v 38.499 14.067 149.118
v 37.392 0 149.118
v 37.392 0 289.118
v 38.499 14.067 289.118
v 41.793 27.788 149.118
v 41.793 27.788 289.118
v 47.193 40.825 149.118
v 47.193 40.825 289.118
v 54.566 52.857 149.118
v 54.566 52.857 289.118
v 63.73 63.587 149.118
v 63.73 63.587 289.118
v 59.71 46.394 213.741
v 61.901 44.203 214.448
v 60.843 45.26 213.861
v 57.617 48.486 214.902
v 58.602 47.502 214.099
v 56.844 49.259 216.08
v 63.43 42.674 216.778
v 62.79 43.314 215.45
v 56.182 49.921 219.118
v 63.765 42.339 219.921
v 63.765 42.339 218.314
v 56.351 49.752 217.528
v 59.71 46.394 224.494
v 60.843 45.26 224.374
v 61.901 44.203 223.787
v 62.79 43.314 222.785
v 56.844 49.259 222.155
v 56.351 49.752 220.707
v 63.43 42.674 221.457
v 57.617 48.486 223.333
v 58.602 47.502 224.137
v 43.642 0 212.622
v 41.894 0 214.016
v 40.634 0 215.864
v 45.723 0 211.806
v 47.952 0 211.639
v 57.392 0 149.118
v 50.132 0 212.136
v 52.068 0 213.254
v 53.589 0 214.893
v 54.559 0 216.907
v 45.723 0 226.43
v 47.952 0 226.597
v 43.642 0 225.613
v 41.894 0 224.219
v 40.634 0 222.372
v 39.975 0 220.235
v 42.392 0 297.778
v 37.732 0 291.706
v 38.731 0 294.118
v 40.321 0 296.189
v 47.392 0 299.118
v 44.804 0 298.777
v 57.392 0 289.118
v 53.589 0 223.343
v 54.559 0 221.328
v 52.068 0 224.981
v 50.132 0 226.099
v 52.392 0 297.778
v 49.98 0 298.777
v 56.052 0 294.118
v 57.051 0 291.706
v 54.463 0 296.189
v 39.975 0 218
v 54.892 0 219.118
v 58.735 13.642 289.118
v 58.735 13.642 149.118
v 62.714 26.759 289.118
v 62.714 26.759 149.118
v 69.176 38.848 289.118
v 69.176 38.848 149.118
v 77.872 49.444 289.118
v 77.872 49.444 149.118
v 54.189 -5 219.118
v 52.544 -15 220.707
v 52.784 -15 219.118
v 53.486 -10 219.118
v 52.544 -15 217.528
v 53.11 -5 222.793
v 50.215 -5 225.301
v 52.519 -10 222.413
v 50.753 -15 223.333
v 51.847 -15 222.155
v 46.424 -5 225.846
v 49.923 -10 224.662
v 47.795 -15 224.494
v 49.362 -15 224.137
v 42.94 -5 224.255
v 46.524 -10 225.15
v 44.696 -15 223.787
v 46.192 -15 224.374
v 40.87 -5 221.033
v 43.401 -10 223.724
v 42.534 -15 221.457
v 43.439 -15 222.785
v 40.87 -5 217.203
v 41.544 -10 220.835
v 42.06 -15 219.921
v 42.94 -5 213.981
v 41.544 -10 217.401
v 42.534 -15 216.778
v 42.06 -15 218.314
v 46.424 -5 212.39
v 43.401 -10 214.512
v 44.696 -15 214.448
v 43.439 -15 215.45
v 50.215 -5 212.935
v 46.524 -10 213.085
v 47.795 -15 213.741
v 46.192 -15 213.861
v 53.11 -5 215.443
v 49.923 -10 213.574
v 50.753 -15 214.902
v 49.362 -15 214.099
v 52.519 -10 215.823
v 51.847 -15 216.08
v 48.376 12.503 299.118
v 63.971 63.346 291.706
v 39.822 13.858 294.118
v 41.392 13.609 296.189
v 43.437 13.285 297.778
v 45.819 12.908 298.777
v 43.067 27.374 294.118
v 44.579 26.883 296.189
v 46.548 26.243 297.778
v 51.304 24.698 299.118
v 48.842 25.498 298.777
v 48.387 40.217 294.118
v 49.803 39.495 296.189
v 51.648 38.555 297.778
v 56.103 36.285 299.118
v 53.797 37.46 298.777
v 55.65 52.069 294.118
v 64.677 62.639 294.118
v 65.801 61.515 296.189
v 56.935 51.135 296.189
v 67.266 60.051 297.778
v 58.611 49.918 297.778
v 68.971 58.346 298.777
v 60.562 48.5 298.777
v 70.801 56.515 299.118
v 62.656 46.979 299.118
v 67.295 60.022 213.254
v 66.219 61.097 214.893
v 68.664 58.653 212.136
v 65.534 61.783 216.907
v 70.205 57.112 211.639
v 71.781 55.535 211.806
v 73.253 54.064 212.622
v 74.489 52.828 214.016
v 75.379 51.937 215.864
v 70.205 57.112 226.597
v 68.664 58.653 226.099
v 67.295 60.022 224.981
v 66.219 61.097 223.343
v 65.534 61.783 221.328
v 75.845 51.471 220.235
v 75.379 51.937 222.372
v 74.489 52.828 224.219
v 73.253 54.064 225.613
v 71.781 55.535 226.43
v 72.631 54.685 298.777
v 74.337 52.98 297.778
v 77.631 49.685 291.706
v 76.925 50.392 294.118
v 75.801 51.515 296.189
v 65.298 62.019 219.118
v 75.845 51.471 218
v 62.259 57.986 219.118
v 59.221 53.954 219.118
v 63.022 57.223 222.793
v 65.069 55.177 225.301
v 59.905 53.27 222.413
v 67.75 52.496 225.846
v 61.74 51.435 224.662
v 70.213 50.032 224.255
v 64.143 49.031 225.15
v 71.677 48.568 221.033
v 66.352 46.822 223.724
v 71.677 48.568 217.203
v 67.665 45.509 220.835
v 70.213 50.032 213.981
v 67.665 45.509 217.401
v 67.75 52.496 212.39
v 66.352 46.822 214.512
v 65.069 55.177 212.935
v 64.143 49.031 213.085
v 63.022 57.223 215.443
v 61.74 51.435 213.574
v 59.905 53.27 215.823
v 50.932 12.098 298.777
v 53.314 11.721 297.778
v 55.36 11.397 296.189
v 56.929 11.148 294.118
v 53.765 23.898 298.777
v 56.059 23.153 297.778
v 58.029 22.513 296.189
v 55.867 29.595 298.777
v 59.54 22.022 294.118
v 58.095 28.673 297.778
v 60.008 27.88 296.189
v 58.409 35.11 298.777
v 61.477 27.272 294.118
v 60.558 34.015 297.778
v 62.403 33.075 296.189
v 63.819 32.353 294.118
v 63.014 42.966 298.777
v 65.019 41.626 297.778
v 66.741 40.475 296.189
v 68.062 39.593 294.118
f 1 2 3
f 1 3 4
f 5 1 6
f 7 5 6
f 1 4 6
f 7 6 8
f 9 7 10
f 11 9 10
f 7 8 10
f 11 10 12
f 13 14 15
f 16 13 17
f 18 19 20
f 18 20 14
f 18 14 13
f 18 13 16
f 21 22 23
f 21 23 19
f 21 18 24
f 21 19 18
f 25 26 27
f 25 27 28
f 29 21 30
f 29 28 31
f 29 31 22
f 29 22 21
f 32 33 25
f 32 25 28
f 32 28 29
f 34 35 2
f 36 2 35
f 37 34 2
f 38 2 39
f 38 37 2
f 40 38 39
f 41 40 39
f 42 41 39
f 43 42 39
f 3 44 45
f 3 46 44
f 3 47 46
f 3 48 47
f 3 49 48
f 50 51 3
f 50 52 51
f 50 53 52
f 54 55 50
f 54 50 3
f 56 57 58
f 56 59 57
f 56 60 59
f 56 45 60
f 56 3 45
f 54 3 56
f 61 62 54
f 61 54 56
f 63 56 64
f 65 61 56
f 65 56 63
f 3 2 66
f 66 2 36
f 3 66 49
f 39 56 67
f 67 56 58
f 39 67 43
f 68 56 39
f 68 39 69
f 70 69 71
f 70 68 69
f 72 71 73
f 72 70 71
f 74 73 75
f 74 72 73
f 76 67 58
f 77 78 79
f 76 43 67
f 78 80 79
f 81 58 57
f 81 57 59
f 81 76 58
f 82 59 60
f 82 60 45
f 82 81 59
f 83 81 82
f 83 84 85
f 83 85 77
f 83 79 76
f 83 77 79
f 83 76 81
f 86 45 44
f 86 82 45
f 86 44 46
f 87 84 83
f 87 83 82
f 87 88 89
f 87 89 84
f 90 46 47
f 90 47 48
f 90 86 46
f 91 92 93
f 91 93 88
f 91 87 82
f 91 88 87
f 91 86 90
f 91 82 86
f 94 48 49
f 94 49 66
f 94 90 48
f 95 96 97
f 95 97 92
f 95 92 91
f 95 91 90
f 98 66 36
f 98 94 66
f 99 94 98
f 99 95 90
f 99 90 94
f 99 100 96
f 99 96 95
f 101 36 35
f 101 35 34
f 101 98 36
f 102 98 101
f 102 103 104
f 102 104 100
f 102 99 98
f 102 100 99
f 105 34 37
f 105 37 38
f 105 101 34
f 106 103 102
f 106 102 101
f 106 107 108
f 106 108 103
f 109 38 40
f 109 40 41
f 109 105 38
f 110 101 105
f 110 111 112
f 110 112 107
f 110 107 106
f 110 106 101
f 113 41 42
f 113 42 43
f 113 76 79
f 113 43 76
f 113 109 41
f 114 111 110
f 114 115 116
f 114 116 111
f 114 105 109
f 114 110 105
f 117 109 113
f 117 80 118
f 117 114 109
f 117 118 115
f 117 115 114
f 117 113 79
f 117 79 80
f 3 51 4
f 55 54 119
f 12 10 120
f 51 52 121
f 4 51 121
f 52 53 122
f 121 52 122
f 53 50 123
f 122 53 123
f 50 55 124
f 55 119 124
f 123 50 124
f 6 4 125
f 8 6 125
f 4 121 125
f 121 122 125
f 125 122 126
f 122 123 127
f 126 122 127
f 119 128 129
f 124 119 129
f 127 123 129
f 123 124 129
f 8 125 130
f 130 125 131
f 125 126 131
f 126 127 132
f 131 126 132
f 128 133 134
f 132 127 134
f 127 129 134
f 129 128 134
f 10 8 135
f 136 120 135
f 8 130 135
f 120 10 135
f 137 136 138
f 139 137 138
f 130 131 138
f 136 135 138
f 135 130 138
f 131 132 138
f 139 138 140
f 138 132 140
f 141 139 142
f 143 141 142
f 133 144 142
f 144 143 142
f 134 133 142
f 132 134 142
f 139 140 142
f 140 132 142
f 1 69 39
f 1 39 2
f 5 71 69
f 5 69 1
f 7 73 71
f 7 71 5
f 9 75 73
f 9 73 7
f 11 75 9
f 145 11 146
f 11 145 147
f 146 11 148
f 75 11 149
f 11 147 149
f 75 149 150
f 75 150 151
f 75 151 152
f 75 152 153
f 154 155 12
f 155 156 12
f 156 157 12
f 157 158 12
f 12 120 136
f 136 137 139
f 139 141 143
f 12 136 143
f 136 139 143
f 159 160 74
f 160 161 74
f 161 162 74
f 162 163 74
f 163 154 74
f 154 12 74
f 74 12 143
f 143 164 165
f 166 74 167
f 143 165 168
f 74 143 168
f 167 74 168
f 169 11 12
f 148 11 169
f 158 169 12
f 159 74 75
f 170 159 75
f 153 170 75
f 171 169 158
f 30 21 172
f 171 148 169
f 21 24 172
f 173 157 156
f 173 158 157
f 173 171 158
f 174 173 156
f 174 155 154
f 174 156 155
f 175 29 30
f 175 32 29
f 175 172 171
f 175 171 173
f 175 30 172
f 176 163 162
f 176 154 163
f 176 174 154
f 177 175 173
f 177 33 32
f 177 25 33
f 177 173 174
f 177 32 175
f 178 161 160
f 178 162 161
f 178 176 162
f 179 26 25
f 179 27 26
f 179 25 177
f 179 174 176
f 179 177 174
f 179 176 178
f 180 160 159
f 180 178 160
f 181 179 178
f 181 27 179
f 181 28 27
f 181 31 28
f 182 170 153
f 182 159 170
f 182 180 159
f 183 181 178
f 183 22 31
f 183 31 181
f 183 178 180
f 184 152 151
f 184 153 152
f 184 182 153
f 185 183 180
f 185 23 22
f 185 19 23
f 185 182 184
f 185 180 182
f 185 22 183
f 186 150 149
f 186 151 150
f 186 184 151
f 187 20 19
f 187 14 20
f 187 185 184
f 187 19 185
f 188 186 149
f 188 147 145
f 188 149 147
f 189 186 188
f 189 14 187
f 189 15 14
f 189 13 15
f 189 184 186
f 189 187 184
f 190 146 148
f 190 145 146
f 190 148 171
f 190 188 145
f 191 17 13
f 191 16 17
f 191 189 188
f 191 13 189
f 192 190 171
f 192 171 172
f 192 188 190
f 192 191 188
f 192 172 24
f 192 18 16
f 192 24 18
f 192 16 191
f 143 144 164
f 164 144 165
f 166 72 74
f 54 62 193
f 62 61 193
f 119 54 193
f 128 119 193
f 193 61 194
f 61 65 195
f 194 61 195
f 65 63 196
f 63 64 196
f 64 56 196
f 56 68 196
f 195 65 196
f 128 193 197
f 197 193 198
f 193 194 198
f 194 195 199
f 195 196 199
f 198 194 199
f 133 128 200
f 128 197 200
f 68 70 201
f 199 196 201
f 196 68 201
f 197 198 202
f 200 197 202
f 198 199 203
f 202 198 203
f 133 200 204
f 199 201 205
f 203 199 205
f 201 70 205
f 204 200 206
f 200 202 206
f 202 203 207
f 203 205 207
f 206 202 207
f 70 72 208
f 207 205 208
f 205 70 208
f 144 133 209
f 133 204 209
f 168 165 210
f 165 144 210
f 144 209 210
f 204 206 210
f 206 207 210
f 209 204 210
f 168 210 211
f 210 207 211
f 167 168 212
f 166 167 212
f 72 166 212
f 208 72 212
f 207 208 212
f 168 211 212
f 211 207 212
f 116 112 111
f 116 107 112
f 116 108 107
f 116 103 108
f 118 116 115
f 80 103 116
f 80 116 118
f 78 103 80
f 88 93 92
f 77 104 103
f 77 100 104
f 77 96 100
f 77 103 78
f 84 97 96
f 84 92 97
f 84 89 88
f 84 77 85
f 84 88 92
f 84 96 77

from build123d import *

# Parameters (mm, degrees)
F0_W     = 89.9249566834
F0_H     = 150
F1_ANGLE = 45
F2_T     = -20
F3_R     = 7.5
F4_DEPTH = 15
F4_TAPER = 8
F5_R     = 7.5
F6_DEPTH = 15
F6_TAPER = 8
F7_R     = 9.99999


# Not quite as in the source:
# - a fillet or chamfer is up to 0.001 mm smaller than in the source, because OpenCascade refuses the exact size
# - a feature names something its author has since deleted; it is built from what else it names


with BuildPart() as f1:
    # F0 (on Front) → F1 (revolve)
    with BuildSketch(Plane.XZ):
        with Locations((82.3541893682, 224.1176688539)):
            Rectangle(F0_W, F0_H)
    revolve(axis=Axis((127.3166677099, 0, 224.1176688539), (0, 0, -1)), revolution_arc=F1_ANGLE)

    # F2
    f2_openings = [f1.faces().sort_by_distance(p)[0] for p in [
        (82.354189, 0, 224.117669),
        (95.523394, 31.793273, 224.117669),
        (73.342731, 22.356737, 149.117669),
        (73.342731, 22.356737, 299.117669),
    ]]
    offset(amount=F2_T, openings=f2_openings)

    # F3 (on face) → F4 (join)
    with BuildSketch(Plane.XZ):
        with Locations((47.3917110264, 219.1176688539)):
            Circle(F3_R)
    extrude(amount=F4_DEPTH, taper=F4_TAPER)

    # F5 (on face) → F6 (cut)
    with BuildSketch(Plane(origin=(63.6583338549, 63.6583338549, 0), x_dir=(-0.7071067812, 0.7071067812, 0), z_dir=(0.7071067812, 0.7071067812, 0))):
        with Locations((-9.8187575006, 219.1176688539)):
            Circle(F5_R)
    extrude(amount=-F6_DEPTH, taper=F6_TAPER, mode=Mode.SUBTRACT)

    # F7 (radius 10 in the source; OpenCascade refuses exactly that, so slightly less here)
    f7_edges = [f1.edges().sort_by_distance(p)[0] for p in [
        (44.236841, 34.412791, 299.117669),
        (62.714431, 26.759122, 299.117669),
    ]]
    fillet(f7_edges, radius=F7_R)


solid = f1.part
